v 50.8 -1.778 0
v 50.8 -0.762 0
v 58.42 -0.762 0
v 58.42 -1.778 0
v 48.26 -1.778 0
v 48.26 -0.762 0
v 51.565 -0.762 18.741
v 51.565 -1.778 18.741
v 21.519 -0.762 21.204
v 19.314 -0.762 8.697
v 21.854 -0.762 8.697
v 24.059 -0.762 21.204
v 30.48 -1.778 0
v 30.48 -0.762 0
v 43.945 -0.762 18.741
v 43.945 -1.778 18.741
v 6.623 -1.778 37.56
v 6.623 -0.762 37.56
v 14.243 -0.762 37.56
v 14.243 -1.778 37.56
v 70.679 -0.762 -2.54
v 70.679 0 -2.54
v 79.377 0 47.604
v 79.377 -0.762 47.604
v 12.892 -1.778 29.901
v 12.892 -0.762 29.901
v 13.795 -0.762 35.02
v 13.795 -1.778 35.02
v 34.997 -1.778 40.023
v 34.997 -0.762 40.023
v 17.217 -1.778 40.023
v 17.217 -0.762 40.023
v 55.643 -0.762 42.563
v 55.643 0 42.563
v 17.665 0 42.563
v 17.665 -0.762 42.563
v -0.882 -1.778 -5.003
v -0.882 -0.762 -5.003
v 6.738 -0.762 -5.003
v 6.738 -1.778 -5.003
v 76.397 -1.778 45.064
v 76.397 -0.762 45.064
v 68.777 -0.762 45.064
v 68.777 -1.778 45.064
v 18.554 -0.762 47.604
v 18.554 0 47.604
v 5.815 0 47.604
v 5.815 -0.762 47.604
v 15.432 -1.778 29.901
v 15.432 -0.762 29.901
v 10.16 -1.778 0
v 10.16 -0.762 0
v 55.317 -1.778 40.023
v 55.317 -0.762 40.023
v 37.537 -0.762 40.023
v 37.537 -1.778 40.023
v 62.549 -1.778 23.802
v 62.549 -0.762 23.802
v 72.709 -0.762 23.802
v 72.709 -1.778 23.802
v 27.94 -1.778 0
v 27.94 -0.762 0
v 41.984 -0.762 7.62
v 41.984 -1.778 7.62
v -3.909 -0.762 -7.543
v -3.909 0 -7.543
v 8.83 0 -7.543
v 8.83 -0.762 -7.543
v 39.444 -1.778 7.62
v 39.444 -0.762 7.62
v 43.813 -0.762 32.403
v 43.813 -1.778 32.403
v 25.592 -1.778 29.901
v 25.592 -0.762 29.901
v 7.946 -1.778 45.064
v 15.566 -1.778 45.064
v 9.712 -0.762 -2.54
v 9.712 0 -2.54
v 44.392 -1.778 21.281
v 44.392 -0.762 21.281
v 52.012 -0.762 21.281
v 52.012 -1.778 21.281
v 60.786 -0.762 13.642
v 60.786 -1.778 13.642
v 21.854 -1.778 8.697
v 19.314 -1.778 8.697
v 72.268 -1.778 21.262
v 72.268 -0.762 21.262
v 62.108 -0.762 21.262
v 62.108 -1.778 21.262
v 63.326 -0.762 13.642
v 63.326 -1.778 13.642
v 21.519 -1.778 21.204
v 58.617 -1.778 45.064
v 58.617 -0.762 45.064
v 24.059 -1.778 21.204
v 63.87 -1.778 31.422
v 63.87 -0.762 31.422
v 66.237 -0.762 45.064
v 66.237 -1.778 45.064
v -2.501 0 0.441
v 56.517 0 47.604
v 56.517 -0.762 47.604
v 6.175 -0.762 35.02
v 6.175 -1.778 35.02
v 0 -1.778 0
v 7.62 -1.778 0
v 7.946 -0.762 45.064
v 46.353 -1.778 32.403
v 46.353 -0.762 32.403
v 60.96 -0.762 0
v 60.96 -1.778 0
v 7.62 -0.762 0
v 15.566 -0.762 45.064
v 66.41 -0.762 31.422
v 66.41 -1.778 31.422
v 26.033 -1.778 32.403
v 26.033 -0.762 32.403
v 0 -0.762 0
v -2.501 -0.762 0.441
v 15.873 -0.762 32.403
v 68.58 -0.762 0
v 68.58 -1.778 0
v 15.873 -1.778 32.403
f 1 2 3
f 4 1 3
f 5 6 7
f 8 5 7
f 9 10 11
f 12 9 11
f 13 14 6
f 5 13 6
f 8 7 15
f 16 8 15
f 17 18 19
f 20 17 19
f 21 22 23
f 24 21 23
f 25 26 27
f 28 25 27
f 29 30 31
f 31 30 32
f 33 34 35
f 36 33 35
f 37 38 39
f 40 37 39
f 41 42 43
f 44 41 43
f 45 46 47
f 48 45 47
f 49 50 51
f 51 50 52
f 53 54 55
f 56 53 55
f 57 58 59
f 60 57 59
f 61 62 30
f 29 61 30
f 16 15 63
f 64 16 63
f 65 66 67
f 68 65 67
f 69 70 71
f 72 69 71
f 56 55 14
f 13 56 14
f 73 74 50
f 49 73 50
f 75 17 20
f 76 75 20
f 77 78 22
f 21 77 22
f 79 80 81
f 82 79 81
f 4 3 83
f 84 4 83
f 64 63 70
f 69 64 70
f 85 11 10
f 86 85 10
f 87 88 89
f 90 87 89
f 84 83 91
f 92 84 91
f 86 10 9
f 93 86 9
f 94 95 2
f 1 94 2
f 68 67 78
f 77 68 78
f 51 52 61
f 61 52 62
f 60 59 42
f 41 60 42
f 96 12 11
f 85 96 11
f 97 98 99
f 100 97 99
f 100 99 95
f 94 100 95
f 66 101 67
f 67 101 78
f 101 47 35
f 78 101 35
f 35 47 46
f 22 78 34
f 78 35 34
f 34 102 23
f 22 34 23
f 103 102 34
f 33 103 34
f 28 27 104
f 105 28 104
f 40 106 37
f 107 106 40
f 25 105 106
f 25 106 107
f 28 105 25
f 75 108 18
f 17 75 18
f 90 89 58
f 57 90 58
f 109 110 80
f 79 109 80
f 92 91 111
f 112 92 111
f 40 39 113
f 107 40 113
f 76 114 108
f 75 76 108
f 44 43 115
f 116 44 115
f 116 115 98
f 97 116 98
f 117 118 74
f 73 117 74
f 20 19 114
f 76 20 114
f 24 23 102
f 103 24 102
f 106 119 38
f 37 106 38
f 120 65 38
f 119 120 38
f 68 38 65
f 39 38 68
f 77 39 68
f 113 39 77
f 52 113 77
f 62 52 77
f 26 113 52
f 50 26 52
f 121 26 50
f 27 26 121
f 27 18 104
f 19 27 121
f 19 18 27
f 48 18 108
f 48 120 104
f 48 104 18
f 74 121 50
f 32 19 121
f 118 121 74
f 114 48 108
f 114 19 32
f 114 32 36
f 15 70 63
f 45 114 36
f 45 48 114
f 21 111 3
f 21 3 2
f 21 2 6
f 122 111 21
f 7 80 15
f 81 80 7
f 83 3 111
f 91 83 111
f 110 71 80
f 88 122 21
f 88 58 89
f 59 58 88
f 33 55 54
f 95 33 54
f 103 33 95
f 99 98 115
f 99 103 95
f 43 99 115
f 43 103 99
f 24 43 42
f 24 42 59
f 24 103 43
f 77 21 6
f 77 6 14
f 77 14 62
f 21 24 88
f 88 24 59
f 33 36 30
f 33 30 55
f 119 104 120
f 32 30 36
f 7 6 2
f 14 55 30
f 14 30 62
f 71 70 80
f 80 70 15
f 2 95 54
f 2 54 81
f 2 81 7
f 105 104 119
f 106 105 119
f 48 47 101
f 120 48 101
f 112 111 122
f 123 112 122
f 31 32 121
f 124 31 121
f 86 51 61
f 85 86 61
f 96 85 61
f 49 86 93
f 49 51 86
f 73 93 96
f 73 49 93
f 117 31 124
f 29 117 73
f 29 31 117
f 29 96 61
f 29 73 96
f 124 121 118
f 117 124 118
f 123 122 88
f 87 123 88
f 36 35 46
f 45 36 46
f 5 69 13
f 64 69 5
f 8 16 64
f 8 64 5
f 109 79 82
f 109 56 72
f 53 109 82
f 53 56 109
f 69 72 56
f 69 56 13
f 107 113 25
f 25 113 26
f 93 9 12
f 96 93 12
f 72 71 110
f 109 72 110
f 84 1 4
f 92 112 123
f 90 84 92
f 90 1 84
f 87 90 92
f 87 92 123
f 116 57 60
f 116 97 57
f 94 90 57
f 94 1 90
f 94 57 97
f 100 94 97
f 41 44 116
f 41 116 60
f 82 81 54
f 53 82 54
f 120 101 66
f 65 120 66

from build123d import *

# Parameters (mm, degrees)
F1_DEPTH = 0.762
F2_DEPTH = 1.778


with BuildPart() as f1:
    # F0 (on Front) → F1 (new body)
    with BuildSketch(Plane.XZ):
        Polygon((-2.501412, 0.441066), (-3.909187, -7.542823), (8.829997, -7.542823), (9.712129, -2.54), (70.679427, -2.54), (79.377093, 47.603999), (56.517093, 47.603999), (55.642641, 42.562587), (17.664932, 42.562587), (18.553869, 47.603999), (5.814686, 47.603999), align=None)
        Polygon((-0.882133, -5.002823), (0, 0), (6.174929, 35.019764), (13.794929, 35.019764), (12.892384, 29.901175), (7.62, 0), (6.737867, -5.002823), align=None, mode=Mode.SUBTRACT)
        Polygon((10.16, 0), (15.432384, 29.901175), (25.592384, 29.901175), (26.03345, 32.402587), (15.87345, 32.402587), (17.217062, 40.022587), (34.997062, 40.022587), (27.94, 0), align=None, mode=Mode.SUBTRACT)
        Polygon((48.26, 0), (30.48, 0), (37.537062, 40.022587), (55.317062, 40.022587), (52.012466, 21.281294), (44.392466, 21.281294), (46.35345, 32.402587), (43.81345, 32.402587), (39.443612, 7.62), (41.983612, 7.62), (43.944596, 18.741294), (51.564596, 18.741294), align=None, mode=Mode.SUBTRACT)
        Polygon((14.2428, 37.559764), (6.6228, 37.559764), (7.945999, 45.063999), (15.565999, 45.063999), align=None, mode=Mode.SUBTRACT)
        Polygon((50.8, 0), (58.61652, 45.063999), (66.23652, 45.063999), (63.870264, 31.421999), (66.410264, 31.421999), (68.77652, 45.063999), (76.39652, 45.063999), (72.708546, 23.801999), (62.548546, 23.801999), (62.107974, 21.261999), (72.267974, 21.261999), (68.58, 0), (60.96, 0), (63.326256, 13.641999), (60.786256, 13.641999), (58.42, 0), align=None, mode=Mode.SUBTRACT)
        Polygon((24.058858, 21.204117), (21.518858, 21.204117), (19.313526, 8.697058), (21.853526, 8.697058), align=None)
    extrude(amount=F1_DEPTH)

    # F0 (on Front) → F2 (join)
    with BuildSketch(Plane.XZ):
        Polygon((6.174929, 35.019764), (0, 0), (7.62, 0), (12.892384, 29.901175), (13.794929, 35.019764), align=None)
        Polygon((7.62, 0), (0, 0), (-0.882133, -5.002823), (6.737867, -5.002823), align=None)
        Polygon((7.945999, 45.063999), (6.6228, 37.559764), (14.2428, 37.559764), (15.565999, 45.063999), align=None)
        Polygon((25.592384, 29.901175), (15.432384, 29.901175), (10.16, 0), (27.94, 0), (34.997062, 40.022587), (17.217062, 40.022587), (15.87345, 32.402587), (26.03345, 32.402587), align=None)
        Polygon((19.313526, 8.697058), (21.518858, 21.204117), (24.058858, 21.204117), (21.853526, 8.697058), align=None, mode=Mode.SUBTRACT)
        Polygon((37.537062, 40.022587), (30.48, 0), (48.26, 0), (51.564596, 18.741294), (43.944596, 18.741294), (41.983612, 7.62), (39.443612, 7.62), (43.81345, 32.402587), (46.35345, 32.402587), (44.392466, 21.281294), (52.012466, 21.281294), (55.317062, 40.022587), align=None)
        Polygon((66.23652, 45.063999), (58.61652, 45.063999), (50.8, 0), (58.42, 0), (60.786256, 13.641999), (63.326256, 13.641999), (60.96, 0), (68.58, 0), (72.267974, 21.261999), (62.107974, 21.261999), (62.548546, 23.801999), (72.708546, 23.801999), (76.39652, 45.063999), (68.77652, 45.063999), (66.410264, 31.421999), (63.870264, 31.421999), align=None)
    extrude(amount=F2_DEPTH)


solid = f1.part
